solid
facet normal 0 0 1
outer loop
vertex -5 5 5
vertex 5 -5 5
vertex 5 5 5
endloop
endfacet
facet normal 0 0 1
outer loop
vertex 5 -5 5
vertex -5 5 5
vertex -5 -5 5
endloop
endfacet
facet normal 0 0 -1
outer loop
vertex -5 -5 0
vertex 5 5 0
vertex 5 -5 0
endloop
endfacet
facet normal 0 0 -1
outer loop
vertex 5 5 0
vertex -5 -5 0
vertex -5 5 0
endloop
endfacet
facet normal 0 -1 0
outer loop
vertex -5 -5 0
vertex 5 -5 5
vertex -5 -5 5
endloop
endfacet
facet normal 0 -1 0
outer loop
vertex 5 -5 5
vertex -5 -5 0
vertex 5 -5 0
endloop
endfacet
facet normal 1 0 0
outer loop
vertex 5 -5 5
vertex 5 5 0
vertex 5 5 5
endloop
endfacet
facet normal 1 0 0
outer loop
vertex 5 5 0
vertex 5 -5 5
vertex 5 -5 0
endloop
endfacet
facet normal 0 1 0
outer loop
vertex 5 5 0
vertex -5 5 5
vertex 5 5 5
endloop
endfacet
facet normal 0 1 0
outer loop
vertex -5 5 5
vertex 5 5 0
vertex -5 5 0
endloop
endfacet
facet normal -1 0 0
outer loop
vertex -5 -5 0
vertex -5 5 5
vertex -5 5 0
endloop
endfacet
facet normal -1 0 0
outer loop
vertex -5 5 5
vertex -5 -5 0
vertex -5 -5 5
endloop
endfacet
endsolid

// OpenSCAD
$fn = 250;

module xycenteredcube(dims) {
  translate([-dims[0]/2, -dims[1]/2, 0]) cube(dims);
}

xycenteredcube([10, 10, 5]);
